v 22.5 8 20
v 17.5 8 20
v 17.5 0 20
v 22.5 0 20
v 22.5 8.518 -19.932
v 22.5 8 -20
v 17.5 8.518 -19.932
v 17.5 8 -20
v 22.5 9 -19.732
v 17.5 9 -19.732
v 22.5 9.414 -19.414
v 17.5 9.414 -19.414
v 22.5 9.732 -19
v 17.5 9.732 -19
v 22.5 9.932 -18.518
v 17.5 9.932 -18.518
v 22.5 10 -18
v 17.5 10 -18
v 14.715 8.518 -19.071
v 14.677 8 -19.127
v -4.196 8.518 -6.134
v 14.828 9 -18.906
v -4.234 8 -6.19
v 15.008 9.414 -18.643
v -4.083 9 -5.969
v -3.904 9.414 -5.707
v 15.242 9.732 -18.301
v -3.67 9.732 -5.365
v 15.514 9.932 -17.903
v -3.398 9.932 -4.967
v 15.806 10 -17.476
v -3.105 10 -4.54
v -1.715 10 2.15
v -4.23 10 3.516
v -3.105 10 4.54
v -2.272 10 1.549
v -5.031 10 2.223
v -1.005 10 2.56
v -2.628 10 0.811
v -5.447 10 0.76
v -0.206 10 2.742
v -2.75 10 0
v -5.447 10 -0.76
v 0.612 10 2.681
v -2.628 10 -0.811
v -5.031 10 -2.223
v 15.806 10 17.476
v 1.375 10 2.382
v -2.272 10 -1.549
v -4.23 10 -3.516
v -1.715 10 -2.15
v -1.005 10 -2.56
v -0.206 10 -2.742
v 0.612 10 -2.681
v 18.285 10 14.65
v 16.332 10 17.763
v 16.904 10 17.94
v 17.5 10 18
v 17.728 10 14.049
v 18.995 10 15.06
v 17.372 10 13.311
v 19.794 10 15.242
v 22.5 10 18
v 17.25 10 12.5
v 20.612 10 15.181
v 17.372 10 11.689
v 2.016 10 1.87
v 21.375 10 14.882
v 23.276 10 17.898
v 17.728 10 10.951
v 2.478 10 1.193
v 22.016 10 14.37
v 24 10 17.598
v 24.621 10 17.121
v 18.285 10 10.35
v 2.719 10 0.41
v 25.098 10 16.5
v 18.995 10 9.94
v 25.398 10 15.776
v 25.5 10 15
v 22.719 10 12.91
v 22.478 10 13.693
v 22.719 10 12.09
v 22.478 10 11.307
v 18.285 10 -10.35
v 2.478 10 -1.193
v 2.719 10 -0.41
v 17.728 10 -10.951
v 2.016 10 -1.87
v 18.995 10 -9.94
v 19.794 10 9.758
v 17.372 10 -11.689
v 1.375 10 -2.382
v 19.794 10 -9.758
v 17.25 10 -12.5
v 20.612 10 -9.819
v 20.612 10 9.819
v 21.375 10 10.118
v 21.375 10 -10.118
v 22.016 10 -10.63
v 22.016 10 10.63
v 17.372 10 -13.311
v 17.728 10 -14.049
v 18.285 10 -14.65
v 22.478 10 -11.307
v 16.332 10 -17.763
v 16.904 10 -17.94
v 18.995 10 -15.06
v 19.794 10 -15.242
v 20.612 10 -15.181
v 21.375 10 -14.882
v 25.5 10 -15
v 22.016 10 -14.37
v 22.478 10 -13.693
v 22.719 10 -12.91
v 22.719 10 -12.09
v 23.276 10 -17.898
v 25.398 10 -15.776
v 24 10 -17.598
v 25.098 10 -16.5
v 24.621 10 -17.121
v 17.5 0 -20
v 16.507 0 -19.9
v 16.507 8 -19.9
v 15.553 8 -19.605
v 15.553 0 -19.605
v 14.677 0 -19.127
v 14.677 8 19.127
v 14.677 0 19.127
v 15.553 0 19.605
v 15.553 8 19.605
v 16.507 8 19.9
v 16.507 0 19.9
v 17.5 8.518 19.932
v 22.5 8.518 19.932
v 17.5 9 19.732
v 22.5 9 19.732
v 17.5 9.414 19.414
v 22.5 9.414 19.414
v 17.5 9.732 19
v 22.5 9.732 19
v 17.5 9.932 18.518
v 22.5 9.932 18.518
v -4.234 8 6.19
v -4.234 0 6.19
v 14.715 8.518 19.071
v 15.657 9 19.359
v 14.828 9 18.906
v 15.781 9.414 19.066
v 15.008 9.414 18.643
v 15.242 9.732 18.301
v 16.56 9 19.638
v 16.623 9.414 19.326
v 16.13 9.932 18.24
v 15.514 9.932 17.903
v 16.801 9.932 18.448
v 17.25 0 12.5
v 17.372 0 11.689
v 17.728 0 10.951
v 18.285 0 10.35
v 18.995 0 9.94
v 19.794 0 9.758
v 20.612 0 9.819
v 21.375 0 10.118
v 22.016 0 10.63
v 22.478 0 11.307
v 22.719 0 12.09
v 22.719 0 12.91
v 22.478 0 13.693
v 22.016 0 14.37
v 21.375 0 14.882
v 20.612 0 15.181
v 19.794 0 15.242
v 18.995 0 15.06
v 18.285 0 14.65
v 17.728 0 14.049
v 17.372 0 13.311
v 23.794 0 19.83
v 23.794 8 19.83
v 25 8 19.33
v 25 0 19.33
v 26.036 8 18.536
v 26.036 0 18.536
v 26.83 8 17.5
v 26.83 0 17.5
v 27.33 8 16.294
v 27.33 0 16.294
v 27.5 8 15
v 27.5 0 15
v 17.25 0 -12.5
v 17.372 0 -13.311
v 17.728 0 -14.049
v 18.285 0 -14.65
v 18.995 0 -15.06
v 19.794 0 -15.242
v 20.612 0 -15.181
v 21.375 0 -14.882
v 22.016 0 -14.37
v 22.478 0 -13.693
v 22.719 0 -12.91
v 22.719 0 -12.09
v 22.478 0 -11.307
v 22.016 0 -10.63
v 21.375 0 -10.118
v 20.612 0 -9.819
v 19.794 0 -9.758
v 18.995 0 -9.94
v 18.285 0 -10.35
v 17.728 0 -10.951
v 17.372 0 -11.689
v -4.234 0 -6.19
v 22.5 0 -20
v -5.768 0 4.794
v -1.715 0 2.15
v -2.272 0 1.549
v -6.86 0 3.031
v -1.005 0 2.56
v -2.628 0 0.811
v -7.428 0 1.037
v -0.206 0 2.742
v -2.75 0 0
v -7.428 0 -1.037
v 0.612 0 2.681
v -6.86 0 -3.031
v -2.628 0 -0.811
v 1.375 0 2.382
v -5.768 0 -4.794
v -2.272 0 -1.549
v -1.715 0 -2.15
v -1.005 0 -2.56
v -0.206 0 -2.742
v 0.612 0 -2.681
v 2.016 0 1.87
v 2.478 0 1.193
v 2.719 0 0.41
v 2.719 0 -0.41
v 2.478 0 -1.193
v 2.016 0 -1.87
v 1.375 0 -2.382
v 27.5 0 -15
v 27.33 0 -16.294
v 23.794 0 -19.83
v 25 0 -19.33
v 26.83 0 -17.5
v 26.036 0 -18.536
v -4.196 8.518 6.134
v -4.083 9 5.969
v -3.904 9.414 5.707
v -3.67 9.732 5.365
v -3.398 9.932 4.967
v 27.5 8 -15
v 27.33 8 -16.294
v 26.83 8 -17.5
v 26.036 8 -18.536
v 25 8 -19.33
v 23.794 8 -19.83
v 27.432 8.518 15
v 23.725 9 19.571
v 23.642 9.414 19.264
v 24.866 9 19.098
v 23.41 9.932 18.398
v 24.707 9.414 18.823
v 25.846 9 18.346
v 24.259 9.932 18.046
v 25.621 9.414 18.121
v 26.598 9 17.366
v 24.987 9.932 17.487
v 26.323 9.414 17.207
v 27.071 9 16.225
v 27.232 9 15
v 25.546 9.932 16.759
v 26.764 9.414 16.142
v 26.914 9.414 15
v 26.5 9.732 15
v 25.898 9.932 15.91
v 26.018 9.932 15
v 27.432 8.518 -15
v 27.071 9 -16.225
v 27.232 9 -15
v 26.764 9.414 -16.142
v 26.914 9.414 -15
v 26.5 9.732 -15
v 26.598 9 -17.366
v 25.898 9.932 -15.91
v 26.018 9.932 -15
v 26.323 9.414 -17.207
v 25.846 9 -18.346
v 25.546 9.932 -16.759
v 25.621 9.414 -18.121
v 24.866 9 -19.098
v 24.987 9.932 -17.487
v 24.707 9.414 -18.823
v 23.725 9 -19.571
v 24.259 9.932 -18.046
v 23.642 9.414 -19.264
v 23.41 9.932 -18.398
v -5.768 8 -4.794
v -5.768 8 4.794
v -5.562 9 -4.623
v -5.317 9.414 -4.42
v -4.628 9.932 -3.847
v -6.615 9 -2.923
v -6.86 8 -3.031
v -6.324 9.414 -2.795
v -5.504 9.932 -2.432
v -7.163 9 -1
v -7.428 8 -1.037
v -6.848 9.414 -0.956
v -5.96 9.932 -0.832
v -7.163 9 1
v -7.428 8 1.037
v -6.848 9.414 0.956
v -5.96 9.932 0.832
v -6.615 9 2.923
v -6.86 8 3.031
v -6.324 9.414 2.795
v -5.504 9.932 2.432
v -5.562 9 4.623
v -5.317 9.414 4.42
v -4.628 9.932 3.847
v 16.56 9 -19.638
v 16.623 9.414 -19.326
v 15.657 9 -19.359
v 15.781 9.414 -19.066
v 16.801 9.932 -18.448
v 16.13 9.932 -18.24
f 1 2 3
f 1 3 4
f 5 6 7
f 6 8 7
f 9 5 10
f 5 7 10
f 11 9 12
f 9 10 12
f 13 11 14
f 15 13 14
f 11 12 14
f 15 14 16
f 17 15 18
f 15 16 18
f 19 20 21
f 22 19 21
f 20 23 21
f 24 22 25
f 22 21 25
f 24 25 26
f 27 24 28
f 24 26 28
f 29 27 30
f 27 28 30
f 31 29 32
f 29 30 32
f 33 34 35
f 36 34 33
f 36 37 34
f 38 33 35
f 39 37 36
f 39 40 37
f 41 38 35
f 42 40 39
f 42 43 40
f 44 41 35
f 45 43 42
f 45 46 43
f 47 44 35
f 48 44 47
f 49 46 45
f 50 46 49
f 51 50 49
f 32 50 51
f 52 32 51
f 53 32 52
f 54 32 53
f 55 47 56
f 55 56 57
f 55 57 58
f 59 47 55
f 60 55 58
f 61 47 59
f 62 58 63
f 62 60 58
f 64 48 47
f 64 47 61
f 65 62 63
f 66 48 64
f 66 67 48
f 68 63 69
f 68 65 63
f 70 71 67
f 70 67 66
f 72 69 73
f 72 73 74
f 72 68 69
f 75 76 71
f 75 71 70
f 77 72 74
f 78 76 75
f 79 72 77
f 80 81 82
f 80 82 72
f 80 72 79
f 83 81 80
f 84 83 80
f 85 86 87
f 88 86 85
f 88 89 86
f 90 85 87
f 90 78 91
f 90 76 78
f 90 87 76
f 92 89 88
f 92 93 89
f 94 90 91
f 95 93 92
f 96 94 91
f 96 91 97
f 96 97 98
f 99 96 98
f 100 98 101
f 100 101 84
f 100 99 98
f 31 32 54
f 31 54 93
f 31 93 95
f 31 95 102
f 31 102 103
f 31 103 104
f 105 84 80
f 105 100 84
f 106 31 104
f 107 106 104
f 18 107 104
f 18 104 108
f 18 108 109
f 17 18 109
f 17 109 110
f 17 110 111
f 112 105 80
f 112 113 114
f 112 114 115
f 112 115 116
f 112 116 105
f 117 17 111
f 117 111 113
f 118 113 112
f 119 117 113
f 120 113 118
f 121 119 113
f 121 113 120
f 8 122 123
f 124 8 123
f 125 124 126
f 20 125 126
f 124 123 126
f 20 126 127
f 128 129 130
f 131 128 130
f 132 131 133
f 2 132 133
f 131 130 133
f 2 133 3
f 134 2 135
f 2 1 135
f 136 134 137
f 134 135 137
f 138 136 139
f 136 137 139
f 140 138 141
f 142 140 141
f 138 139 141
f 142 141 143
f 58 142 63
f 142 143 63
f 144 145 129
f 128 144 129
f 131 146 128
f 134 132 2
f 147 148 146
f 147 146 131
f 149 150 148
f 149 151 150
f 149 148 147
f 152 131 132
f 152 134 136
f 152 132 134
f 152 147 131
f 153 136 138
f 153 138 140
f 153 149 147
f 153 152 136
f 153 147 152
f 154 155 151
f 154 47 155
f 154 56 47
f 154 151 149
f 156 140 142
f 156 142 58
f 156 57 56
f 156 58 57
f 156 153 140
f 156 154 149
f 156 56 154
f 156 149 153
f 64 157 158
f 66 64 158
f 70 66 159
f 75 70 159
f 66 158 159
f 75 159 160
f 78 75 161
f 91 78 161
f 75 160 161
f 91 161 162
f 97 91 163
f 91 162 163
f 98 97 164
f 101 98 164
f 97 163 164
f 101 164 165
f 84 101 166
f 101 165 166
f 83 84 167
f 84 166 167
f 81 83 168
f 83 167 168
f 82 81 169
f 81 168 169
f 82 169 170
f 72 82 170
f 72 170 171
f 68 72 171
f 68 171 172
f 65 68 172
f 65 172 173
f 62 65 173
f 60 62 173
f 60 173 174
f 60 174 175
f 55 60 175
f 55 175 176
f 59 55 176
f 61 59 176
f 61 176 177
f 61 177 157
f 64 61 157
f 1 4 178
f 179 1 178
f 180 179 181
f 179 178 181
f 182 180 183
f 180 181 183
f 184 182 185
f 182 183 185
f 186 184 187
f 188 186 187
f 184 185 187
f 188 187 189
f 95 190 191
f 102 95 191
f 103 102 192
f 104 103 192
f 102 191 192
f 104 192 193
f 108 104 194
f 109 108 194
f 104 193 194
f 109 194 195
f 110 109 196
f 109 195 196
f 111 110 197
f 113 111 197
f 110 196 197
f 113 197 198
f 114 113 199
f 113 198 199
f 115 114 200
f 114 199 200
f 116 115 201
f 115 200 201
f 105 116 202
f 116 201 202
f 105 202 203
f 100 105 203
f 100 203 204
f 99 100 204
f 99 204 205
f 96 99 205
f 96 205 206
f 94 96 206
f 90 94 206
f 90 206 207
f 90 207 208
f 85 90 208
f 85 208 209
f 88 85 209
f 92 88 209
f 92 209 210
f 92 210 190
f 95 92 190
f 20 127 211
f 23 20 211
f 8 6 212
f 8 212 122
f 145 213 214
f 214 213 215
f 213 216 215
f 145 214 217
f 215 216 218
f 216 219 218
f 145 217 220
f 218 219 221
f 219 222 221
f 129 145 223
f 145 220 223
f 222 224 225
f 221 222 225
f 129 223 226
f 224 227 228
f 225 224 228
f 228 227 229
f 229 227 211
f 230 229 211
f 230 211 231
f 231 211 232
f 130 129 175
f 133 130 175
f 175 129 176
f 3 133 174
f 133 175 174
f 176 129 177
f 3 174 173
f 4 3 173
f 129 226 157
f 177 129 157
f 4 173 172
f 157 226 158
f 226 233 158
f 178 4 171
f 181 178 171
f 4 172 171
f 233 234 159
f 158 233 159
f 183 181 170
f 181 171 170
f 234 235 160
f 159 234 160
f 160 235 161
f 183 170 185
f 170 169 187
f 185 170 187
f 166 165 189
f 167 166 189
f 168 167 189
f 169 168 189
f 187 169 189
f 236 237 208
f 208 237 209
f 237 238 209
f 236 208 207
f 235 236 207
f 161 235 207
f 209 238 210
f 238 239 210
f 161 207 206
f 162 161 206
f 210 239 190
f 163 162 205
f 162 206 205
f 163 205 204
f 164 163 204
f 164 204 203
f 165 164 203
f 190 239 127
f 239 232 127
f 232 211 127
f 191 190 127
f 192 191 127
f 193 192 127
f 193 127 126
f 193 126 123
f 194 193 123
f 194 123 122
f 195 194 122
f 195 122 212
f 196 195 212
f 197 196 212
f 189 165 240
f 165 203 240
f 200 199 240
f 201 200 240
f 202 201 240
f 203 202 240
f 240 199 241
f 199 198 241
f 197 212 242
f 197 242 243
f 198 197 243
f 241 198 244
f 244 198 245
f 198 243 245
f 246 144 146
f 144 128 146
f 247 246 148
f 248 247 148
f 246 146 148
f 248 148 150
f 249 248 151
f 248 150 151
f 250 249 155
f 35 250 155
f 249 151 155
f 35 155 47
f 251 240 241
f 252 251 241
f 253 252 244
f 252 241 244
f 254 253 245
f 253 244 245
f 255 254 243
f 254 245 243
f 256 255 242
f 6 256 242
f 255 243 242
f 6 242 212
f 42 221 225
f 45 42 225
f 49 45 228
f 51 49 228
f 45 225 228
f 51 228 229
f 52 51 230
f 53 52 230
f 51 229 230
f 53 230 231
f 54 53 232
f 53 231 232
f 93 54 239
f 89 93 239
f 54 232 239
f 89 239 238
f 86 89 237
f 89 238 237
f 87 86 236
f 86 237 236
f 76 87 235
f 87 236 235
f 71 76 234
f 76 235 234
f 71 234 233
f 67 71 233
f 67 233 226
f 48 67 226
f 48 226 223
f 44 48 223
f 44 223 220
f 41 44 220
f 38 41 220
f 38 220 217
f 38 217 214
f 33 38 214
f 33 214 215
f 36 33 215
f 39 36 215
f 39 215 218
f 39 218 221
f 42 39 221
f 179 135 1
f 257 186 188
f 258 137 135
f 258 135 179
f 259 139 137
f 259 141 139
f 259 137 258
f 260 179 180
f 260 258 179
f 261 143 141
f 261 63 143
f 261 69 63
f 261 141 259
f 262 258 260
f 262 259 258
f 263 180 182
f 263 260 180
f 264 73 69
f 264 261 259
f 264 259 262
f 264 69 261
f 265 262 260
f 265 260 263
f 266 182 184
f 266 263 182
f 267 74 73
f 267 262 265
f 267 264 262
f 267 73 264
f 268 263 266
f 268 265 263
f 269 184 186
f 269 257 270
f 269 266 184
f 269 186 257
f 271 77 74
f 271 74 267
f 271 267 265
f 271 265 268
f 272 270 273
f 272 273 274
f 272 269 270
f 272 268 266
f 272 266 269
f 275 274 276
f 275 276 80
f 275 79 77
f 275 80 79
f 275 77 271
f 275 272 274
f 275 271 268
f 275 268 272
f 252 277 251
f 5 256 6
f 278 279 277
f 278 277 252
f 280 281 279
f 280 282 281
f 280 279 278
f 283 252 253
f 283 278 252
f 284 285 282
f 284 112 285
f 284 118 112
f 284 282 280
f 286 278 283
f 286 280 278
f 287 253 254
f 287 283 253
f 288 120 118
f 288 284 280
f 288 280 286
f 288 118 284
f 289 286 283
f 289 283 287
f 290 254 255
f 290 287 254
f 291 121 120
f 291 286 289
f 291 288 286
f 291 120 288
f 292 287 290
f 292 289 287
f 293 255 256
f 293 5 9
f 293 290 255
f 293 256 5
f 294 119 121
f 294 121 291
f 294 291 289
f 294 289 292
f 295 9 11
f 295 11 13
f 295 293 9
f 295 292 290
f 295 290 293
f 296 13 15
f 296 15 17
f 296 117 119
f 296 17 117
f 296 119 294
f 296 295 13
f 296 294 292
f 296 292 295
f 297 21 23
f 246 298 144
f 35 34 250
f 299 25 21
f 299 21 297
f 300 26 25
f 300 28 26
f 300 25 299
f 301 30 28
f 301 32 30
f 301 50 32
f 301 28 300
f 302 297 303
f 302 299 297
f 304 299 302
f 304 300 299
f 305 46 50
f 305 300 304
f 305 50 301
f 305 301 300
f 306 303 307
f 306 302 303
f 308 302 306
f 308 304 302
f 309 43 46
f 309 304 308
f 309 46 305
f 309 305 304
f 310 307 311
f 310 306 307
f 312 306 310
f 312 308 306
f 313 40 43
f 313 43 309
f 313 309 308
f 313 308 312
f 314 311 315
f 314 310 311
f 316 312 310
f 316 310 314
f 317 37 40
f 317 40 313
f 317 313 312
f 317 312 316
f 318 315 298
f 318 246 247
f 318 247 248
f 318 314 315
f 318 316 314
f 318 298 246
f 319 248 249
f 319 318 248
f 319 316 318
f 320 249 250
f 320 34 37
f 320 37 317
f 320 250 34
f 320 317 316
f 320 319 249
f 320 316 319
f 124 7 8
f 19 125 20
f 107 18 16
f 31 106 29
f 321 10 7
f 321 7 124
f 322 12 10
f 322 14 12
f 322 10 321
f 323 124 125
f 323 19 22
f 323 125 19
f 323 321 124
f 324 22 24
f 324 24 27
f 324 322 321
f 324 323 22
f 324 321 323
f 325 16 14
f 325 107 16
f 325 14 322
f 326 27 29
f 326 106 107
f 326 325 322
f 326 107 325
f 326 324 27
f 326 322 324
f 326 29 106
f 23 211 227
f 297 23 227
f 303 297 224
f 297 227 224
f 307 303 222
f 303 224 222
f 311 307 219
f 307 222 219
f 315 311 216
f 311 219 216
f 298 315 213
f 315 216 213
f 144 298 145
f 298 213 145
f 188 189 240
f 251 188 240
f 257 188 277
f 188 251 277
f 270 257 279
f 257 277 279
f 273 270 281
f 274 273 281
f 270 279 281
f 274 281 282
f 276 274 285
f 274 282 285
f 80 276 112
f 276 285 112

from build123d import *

# Parameters (mm, degrees)
BOSS_EXTRUDE1_DEPTH  = 10
M5_CLEARANCE_HOLE1_D = 5.5
FILLET1_R            = 2


with BuildPart() as part:
    # Sketch1 → Boss-Extrude1 (new body)
    with BuildSketch(Plane(origin=(0, 0, 0), x_dir=(1, 0, 0), z_dir=(0, 1, 0))):
        with BuildLine():
            Line((-4.234491912, -6.190240564), (14.677005392, -19.126827043))
            ThreePointArc((14.677005392, -19.126827043), (16.022524994, -19.776721429), (17.5, -20))
            Line((17.5, -20), (22.5, -20))
            ThreePointArc((22.5, -20), (26.035533906, -18.535533906), (27.5, -15))
            Line((27.5, -15), (27.5, 15))
            ThreePointArc((27.5, 15), (26.035533906, 18.535533906), (22.5, 20))
            Line((22.5, 20), (17.5, 20))
            ThreePointArc((17.5, 20), (16.022524994, 19.776721429), (14.677005392, 19.126827043))
            Line((14.677005392, 19.126827043), (-4.234491912, 6.190240564))
            ThreePointArc((-4.234491912, 6.190240564), (-7.5, 0), (-4.234491912, -6.190240564))
        make_face()
    extrude(amount=BOSS_EXTRUDE1_DEPTH)

    # M5 Clearance Hole1 (through all)
    with Locations(Plane(origin=(0, 10, 0), x_dir=(1, 0, 0), z_dir=(0, 1, 0))):
        with Locations((0, 0), (20, 12.5), (20, -12.5)):
            Hole(M5_CLEARANCE_HOLE1_D / 2)

    # Fillet1
    fillet1_edges = [part.edges().sort_by_distance(p)[0] for p in [
        (16.022524994, 10, 19.776721429),
        (20, 10, 20),
        (26.035533906, 10, 18.535533906),
        (27.5, 10, 0),
        (26.035533906, 10, -18.535533906),
        (20, 10, -20),
        (16.022524994, 10, -19.776721429),
        (5.22125674, 10, -12.658533804),
        (-7.5, 10, 0),
        (5.22125674, 10, 12.658533804),
    ]]
    fillet(fillet1_edges, radius=FILLET1_R)


solid = part.part
